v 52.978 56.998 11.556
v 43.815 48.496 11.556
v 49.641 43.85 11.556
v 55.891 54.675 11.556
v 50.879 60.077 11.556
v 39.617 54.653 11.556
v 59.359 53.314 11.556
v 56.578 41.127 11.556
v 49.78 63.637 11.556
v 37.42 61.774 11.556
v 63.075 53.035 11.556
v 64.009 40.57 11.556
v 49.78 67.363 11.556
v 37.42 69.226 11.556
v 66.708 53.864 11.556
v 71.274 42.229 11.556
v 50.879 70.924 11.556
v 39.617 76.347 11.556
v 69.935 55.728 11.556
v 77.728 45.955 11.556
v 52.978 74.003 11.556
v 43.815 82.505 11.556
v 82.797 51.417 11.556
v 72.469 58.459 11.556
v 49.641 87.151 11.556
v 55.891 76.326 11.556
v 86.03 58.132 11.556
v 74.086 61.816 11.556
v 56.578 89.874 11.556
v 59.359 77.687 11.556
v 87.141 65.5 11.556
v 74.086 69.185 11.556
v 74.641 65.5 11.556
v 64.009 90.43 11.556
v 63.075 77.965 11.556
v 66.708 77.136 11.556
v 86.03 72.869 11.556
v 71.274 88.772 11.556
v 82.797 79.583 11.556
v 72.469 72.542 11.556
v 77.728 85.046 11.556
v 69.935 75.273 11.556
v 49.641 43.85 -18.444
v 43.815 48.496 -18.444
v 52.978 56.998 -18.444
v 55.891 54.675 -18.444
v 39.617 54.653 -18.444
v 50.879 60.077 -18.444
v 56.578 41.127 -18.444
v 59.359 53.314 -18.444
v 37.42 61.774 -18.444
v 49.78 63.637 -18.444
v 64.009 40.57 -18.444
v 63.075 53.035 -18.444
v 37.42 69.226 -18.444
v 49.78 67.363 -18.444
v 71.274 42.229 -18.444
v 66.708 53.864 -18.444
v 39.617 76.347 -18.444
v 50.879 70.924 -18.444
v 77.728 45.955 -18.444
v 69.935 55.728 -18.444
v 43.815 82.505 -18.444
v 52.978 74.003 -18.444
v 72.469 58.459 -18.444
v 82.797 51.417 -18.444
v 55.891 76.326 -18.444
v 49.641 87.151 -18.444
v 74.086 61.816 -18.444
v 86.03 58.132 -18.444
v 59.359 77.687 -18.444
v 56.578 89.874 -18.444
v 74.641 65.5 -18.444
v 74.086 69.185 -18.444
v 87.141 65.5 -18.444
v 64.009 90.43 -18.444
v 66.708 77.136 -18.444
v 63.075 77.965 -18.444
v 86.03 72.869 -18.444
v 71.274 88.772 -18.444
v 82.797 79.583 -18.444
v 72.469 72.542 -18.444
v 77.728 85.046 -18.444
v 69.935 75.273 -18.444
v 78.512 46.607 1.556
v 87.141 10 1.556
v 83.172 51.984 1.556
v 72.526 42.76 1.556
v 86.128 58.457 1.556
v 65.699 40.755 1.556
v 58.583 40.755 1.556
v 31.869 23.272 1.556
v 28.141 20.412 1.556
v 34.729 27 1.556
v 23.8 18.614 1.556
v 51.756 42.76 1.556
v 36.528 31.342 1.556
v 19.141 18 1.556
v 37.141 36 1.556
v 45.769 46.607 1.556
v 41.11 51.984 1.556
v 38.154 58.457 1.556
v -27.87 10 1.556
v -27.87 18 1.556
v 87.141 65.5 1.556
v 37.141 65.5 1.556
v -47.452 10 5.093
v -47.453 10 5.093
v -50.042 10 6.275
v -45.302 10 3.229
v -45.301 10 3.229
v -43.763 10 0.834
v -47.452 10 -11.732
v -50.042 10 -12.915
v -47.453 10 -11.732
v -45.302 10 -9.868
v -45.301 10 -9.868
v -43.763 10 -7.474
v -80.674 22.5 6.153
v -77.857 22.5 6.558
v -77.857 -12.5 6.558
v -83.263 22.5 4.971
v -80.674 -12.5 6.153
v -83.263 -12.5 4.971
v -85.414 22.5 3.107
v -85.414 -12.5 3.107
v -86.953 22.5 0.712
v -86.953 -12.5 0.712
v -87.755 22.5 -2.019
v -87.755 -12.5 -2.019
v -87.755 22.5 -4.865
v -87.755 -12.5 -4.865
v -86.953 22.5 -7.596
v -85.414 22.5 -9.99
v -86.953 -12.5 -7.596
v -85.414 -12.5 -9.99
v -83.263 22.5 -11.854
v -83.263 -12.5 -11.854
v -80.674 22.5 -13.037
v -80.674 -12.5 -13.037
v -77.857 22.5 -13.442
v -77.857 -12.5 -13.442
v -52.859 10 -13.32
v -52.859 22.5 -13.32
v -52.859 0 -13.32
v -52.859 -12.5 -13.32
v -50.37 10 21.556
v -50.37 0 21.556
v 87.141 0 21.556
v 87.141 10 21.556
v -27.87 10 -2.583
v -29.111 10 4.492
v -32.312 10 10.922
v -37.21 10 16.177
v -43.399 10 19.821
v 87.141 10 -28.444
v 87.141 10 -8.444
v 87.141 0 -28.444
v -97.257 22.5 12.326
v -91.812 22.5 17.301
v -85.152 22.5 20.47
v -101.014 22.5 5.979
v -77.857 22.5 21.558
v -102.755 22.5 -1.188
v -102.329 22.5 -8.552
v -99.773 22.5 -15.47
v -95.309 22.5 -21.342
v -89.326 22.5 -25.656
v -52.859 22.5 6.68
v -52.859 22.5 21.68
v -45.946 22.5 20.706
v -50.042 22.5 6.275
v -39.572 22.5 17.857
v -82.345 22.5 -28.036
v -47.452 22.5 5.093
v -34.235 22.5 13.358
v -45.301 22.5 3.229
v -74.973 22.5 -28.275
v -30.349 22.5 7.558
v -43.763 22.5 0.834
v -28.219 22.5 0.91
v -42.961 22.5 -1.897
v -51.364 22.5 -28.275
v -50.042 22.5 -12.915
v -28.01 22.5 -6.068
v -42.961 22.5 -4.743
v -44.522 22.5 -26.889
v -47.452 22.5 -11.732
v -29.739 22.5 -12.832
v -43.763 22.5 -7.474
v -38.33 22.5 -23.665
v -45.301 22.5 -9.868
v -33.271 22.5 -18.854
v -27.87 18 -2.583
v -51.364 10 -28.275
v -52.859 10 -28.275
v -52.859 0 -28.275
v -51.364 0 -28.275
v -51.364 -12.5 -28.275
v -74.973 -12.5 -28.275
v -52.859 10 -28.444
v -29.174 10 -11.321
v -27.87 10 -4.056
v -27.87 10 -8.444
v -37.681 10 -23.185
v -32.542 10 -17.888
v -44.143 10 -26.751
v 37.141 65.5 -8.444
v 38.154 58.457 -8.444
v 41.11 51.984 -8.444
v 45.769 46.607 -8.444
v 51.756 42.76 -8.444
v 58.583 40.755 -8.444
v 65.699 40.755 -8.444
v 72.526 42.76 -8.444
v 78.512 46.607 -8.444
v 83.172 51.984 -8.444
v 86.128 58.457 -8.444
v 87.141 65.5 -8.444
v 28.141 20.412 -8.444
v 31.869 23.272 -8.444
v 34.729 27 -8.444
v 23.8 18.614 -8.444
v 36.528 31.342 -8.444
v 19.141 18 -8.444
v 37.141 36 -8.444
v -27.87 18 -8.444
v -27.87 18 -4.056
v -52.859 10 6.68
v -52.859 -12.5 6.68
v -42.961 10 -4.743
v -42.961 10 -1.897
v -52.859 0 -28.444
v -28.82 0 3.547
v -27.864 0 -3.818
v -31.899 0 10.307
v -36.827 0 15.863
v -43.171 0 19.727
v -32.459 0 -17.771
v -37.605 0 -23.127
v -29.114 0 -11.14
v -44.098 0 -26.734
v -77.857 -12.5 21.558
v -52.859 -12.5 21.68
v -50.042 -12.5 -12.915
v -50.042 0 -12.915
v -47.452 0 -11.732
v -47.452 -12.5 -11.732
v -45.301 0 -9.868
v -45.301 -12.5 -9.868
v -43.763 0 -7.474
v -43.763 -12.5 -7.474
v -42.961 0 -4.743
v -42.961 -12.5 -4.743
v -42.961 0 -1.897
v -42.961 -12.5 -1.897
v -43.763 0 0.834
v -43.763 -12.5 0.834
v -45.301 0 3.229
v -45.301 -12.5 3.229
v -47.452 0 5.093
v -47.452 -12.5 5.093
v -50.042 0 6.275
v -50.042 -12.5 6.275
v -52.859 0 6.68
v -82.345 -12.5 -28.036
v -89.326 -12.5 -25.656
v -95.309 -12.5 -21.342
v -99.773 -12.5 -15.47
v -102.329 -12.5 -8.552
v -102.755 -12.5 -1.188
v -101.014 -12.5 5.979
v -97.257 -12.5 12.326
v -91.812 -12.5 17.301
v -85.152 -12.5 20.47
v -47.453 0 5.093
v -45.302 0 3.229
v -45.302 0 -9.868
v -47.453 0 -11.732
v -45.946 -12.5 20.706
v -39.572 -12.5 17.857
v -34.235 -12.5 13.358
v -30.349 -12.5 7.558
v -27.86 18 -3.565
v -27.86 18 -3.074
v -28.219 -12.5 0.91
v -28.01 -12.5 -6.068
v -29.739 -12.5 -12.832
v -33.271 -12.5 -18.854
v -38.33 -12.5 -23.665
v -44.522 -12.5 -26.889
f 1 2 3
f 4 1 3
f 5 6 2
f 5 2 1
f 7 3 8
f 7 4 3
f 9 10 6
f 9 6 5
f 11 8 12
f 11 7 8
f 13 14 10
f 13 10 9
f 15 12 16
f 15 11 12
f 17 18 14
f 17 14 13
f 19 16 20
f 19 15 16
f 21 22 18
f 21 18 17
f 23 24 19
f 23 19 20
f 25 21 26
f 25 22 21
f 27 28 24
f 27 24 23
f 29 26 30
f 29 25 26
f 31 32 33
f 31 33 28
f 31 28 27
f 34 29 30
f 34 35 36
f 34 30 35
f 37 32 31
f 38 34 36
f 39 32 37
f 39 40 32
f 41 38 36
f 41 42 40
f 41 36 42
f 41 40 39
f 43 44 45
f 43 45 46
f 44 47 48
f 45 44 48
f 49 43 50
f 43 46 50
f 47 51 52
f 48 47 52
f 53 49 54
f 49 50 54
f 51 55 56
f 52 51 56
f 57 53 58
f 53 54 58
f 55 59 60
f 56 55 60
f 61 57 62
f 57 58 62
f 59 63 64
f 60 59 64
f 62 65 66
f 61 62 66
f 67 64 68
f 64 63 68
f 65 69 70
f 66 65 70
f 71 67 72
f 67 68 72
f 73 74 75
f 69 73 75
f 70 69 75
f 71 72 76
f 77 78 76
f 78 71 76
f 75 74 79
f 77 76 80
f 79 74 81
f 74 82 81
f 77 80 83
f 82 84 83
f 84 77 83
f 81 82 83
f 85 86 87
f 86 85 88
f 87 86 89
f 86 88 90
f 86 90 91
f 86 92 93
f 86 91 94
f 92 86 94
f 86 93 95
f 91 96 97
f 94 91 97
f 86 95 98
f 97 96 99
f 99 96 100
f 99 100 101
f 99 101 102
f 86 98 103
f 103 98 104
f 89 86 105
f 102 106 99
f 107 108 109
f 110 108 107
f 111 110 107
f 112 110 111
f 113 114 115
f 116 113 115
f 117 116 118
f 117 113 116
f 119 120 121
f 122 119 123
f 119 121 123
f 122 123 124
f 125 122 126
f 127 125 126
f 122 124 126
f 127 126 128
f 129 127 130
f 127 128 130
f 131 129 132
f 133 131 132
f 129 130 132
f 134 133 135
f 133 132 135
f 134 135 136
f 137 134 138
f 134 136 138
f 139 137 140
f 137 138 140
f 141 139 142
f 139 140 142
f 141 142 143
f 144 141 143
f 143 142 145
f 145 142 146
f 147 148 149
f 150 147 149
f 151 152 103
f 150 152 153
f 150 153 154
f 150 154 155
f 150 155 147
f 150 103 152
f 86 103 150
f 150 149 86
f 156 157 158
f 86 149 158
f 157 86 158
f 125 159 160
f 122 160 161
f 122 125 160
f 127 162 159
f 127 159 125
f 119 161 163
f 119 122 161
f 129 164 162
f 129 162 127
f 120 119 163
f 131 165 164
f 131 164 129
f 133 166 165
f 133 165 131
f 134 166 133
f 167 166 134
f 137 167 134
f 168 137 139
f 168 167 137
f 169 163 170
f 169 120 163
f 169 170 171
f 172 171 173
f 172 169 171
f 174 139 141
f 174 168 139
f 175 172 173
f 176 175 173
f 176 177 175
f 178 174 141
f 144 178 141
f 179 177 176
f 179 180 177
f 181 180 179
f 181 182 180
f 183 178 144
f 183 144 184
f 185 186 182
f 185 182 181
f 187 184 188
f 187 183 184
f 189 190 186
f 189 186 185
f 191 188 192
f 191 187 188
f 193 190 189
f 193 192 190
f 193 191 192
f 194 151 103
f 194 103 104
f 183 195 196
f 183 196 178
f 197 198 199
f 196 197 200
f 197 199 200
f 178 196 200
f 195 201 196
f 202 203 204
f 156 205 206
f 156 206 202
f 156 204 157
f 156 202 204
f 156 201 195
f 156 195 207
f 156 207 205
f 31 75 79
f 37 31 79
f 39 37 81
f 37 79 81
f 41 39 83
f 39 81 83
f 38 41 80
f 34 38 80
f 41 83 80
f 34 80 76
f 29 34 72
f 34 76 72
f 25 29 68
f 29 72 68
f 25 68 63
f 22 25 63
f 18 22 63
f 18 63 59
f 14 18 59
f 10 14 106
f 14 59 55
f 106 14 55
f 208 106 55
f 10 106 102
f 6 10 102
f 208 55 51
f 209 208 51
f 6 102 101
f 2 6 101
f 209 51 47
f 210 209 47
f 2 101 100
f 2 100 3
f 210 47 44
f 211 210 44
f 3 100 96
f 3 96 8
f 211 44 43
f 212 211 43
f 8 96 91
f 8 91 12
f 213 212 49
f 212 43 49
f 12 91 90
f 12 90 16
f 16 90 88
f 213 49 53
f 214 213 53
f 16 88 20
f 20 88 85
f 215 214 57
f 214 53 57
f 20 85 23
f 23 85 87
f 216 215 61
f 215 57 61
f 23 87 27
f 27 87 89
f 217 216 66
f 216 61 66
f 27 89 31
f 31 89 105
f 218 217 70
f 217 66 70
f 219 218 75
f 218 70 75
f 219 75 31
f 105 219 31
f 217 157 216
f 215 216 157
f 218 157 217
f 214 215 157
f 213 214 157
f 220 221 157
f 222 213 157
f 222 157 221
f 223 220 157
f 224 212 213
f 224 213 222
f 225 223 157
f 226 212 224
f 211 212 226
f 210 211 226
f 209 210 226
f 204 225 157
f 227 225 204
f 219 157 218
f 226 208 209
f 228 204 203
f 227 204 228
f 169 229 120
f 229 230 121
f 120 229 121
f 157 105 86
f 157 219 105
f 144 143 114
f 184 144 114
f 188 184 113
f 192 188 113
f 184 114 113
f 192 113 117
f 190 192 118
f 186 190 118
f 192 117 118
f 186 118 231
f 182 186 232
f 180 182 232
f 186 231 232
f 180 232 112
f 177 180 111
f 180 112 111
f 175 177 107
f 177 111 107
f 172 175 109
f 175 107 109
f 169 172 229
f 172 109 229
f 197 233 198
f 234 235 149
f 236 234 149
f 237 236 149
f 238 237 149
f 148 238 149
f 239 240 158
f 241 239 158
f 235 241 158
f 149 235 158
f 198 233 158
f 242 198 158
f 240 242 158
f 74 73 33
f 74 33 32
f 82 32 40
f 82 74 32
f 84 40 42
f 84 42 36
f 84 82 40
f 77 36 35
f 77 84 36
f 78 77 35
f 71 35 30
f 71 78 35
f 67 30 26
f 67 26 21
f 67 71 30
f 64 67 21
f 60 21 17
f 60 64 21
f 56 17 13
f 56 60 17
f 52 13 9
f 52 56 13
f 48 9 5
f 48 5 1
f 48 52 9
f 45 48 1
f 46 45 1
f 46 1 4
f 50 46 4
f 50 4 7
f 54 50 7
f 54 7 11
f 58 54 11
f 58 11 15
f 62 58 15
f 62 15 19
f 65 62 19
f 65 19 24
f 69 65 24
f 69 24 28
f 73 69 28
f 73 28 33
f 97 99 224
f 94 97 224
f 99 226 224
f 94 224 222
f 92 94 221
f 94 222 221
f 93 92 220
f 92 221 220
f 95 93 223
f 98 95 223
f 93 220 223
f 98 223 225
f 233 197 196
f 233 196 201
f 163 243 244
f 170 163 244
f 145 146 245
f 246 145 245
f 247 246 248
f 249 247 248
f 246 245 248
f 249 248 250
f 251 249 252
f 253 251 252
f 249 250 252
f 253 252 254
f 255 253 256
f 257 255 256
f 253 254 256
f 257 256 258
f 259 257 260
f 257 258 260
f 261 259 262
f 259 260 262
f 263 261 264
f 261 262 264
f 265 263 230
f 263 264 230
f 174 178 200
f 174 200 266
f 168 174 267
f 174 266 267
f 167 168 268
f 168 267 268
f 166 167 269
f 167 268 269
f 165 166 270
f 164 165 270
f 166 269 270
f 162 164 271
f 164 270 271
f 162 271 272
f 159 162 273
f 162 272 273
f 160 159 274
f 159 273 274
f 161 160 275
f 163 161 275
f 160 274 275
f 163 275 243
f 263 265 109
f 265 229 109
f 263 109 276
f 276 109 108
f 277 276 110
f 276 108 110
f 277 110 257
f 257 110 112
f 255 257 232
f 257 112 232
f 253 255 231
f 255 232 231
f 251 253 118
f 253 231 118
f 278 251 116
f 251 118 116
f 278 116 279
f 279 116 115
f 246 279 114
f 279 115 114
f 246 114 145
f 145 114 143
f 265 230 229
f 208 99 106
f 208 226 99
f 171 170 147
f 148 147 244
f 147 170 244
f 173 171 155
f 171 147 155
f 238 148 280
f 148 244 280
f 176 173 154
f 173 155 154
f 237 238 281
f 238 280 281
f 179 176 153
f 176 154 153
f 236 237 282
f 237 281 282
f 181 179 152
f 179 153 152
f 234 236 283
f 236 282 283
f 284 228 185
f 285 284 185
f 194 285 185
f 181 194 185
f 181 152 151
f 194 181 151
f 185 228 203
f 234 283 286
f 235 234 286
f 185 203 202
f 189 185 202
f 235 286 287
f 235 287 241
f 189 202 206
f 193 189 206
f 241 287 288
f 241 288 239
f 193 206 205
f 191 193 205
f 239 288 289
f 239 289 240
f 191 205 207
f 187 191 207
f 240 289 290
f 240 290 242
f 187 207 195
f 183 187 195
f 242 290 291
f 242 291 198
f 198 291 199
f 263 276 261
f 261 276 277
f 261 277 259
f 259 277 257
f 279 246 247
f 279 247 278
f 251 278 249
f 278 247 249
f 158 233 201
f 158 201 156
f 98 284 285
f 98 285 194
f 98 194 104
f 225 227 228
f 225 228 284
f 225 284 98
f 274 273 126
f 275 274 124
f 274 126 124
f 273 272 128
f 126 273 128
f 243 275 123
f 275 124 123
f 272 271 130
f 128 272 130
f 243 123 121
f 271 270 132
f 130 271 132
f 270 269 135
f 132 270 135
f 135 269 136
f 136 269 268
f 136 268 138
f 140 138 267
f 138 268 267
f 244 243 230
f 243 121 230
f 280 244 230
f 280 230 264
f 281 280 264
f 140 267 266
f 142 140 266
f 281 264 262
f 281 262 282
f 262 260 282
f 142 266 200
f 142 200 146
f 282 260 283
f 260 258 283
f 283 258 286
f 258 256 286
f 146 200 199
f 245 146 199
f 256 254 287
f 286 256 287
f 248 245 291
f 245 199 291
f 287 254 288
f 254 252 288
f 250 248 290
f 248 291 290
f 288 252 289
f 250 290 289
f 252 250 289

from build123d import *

# Parameters (mm, degrees)
SKETCH1_W                 = 140
SKETCH1_H                 = 50
BOSS_EXTRUDE1_DEPTH       = 10
BOSS_EXTRUDE2_START       = -12.5
BOSS_EXTRUDE2_DEPTH       = 35
CUT_EXTRUDE1_DEPTH        = 50
BOSS_EXTRUDE8_DEPTH       = 5
BOSS_EXTRUDE9_START       = -18.443977
BOSS_EXTRUDE9_OUTLINE_R   = 25
BOSS_EXTRUDE9_OUTLINE_R_2 = 12.5
BOSS_EXTRUDE9_DEPTH       = 30
FILLET1_R                 = 18
CUT_EXTRUDE2_START        = -30
CUT_EXTRUDE2_DEPTH        = 30


# Read off the part's stored shape, not the designer's step: Boss-Extrude2, Boss-Extrude9
with BuildPart() as part:
    # Sketch1 → Boss-Extrude1 (new body)
    with BuildSketch(Plane(origin=(0, 0, 0), x_dir=(1, 0, 0), z_dir=(0, 1, 0))):
        with Locations((17.140882, 3.443977)):
            Rectangle(SKETCH1_W, SKETCH1_H)
    extrude(amount=BOSS_EXTRUDE1_DEPTH)

    # Boss-Extrude2 outline → Boss-Extrude2 (add)
    with BuildSketch(Plane(origin=(0, 0, 0), x_dir=(1, 0, 0), z_dir=(0, 1, 0)).offset(BOSS_EXTRUDE2_START)):
        with BuildLine():
            Line((-51.363996, 28.275018), (-52.859118, 28.275018))
            Line((-52.859118, 28.275018), (-74.973336, 28.275018))
            ThreePointArc((-74.973336, 28.275018), (-102.814942, 4.885934), (-77.856685, -21.558151))
            Line((-77.856685, -21.558151), (-52.858882, -21.680248))
            ThreePointArc((-52.858882, -21.680248), (-27.870068, 2.571974), (-51.363996, 28.275018))
        make_face()
        with BuildLine():
            Line((-52.859118, 13.319754), (-52.858882, 13.319753))
            ThreePointArc((-52.858882, 13.319753), (-42.85888, 3.319752), (-52.858882, -6.68025))
            Line((-52.858882, -6.68025), (-52.859118, -6.680248))
            Line((-52.859118, -6.680248), (-77.856685, -6.558153))
            ThreePointArc((-77.856685, -6.558153), (-87.856686, 3.441849), (-77.856685, 13.44185))
            Line((-77.856685, 13.44185), (-52.859118, 13.319754))
        make_face(mode=Mode.SUBTRACT)
    extrude(amount=BOSS_EXTRUDE2_DEPTH)

    # Sketch2 → Cut-Extrude1 (cut)
    with BuildSketch(Plane(origin=(0, 10, 0), x_dir=(1, 0, 0), z_dir=(0, 1, 0))):
        with BuildLine():
            Line((-52.859118, 13.319753), (-52.859118, -6.68025))
            ThreePointArc((-52.859118, -6.68025), (-42.859116, 3.319752), (-52.859118, 13.319753))
        make_face()
    extrude(amount=-CUT_EXTRUDE1_DEPTH, mode=Mode.SUBTRACT)

    # 3DSketch2 → Boss-Extrude8 (add, symmetric)
    with BuildSketch(Plane(origin=(87.140882, 10, -3.443977), x_dir=(-0.9975892937431798, 0.0693945315495666, 0), z_dir=(0, 0, -1))):
        Polygon((0, 0), (114.733361, -7.981108), (115.288545, 0), (50.434648, 4.511381), (53.730889, 51.896873), (3.851424, 55.366599), align=None)
    extrude(amount=BOSS_EXTRUDE8_DEPTH, both=True)

    # Boss-Extrude9 outline → Boss-Extrude9 (add)
    with BuildSketch(Plane.XY.offset(BOSS_EXTRUDE9_START)):
        with Locations((62.140882, 65.500395)):
            Circle(BOSS_EXTRUDE9_OUTLINE_R)
        with Locations((62.140882, 65.500395)):
            Circle(BOSS_EXTRUDE9_OUTLINE_R_2, mode=Mode.SUBTRACT)
    extrude(amount=BOSS_EXTRUDE9_DEPTH)

    # Fillet1
    fillet1_edges = [part.edges().sort_by_distance(p)[0] for p in [
        (37.140882, 18.000395, -3.443977),
    ]]
    fillet(fillet1_edges, radius=FILLET1_R)

    # Sketch3 → Cut-Extrude2 (cut)
    with BuildSketch(Plane.XY.offset(1.556023).offset(CUT_EXTRUDE2_START)):
        with BuildLine():
            Line((74.640882, 65.500395), (49.640882, 65.500395))
            ThreePointArc((49.640882, 65.500395), (62.140882, 53.000395), (74.640882, 65.500395))
        make_face()
    extrude(amount=CUT_EXTRUDE2_DEPTH, mode=Mode.SUBTRACT)


solid = part.part
